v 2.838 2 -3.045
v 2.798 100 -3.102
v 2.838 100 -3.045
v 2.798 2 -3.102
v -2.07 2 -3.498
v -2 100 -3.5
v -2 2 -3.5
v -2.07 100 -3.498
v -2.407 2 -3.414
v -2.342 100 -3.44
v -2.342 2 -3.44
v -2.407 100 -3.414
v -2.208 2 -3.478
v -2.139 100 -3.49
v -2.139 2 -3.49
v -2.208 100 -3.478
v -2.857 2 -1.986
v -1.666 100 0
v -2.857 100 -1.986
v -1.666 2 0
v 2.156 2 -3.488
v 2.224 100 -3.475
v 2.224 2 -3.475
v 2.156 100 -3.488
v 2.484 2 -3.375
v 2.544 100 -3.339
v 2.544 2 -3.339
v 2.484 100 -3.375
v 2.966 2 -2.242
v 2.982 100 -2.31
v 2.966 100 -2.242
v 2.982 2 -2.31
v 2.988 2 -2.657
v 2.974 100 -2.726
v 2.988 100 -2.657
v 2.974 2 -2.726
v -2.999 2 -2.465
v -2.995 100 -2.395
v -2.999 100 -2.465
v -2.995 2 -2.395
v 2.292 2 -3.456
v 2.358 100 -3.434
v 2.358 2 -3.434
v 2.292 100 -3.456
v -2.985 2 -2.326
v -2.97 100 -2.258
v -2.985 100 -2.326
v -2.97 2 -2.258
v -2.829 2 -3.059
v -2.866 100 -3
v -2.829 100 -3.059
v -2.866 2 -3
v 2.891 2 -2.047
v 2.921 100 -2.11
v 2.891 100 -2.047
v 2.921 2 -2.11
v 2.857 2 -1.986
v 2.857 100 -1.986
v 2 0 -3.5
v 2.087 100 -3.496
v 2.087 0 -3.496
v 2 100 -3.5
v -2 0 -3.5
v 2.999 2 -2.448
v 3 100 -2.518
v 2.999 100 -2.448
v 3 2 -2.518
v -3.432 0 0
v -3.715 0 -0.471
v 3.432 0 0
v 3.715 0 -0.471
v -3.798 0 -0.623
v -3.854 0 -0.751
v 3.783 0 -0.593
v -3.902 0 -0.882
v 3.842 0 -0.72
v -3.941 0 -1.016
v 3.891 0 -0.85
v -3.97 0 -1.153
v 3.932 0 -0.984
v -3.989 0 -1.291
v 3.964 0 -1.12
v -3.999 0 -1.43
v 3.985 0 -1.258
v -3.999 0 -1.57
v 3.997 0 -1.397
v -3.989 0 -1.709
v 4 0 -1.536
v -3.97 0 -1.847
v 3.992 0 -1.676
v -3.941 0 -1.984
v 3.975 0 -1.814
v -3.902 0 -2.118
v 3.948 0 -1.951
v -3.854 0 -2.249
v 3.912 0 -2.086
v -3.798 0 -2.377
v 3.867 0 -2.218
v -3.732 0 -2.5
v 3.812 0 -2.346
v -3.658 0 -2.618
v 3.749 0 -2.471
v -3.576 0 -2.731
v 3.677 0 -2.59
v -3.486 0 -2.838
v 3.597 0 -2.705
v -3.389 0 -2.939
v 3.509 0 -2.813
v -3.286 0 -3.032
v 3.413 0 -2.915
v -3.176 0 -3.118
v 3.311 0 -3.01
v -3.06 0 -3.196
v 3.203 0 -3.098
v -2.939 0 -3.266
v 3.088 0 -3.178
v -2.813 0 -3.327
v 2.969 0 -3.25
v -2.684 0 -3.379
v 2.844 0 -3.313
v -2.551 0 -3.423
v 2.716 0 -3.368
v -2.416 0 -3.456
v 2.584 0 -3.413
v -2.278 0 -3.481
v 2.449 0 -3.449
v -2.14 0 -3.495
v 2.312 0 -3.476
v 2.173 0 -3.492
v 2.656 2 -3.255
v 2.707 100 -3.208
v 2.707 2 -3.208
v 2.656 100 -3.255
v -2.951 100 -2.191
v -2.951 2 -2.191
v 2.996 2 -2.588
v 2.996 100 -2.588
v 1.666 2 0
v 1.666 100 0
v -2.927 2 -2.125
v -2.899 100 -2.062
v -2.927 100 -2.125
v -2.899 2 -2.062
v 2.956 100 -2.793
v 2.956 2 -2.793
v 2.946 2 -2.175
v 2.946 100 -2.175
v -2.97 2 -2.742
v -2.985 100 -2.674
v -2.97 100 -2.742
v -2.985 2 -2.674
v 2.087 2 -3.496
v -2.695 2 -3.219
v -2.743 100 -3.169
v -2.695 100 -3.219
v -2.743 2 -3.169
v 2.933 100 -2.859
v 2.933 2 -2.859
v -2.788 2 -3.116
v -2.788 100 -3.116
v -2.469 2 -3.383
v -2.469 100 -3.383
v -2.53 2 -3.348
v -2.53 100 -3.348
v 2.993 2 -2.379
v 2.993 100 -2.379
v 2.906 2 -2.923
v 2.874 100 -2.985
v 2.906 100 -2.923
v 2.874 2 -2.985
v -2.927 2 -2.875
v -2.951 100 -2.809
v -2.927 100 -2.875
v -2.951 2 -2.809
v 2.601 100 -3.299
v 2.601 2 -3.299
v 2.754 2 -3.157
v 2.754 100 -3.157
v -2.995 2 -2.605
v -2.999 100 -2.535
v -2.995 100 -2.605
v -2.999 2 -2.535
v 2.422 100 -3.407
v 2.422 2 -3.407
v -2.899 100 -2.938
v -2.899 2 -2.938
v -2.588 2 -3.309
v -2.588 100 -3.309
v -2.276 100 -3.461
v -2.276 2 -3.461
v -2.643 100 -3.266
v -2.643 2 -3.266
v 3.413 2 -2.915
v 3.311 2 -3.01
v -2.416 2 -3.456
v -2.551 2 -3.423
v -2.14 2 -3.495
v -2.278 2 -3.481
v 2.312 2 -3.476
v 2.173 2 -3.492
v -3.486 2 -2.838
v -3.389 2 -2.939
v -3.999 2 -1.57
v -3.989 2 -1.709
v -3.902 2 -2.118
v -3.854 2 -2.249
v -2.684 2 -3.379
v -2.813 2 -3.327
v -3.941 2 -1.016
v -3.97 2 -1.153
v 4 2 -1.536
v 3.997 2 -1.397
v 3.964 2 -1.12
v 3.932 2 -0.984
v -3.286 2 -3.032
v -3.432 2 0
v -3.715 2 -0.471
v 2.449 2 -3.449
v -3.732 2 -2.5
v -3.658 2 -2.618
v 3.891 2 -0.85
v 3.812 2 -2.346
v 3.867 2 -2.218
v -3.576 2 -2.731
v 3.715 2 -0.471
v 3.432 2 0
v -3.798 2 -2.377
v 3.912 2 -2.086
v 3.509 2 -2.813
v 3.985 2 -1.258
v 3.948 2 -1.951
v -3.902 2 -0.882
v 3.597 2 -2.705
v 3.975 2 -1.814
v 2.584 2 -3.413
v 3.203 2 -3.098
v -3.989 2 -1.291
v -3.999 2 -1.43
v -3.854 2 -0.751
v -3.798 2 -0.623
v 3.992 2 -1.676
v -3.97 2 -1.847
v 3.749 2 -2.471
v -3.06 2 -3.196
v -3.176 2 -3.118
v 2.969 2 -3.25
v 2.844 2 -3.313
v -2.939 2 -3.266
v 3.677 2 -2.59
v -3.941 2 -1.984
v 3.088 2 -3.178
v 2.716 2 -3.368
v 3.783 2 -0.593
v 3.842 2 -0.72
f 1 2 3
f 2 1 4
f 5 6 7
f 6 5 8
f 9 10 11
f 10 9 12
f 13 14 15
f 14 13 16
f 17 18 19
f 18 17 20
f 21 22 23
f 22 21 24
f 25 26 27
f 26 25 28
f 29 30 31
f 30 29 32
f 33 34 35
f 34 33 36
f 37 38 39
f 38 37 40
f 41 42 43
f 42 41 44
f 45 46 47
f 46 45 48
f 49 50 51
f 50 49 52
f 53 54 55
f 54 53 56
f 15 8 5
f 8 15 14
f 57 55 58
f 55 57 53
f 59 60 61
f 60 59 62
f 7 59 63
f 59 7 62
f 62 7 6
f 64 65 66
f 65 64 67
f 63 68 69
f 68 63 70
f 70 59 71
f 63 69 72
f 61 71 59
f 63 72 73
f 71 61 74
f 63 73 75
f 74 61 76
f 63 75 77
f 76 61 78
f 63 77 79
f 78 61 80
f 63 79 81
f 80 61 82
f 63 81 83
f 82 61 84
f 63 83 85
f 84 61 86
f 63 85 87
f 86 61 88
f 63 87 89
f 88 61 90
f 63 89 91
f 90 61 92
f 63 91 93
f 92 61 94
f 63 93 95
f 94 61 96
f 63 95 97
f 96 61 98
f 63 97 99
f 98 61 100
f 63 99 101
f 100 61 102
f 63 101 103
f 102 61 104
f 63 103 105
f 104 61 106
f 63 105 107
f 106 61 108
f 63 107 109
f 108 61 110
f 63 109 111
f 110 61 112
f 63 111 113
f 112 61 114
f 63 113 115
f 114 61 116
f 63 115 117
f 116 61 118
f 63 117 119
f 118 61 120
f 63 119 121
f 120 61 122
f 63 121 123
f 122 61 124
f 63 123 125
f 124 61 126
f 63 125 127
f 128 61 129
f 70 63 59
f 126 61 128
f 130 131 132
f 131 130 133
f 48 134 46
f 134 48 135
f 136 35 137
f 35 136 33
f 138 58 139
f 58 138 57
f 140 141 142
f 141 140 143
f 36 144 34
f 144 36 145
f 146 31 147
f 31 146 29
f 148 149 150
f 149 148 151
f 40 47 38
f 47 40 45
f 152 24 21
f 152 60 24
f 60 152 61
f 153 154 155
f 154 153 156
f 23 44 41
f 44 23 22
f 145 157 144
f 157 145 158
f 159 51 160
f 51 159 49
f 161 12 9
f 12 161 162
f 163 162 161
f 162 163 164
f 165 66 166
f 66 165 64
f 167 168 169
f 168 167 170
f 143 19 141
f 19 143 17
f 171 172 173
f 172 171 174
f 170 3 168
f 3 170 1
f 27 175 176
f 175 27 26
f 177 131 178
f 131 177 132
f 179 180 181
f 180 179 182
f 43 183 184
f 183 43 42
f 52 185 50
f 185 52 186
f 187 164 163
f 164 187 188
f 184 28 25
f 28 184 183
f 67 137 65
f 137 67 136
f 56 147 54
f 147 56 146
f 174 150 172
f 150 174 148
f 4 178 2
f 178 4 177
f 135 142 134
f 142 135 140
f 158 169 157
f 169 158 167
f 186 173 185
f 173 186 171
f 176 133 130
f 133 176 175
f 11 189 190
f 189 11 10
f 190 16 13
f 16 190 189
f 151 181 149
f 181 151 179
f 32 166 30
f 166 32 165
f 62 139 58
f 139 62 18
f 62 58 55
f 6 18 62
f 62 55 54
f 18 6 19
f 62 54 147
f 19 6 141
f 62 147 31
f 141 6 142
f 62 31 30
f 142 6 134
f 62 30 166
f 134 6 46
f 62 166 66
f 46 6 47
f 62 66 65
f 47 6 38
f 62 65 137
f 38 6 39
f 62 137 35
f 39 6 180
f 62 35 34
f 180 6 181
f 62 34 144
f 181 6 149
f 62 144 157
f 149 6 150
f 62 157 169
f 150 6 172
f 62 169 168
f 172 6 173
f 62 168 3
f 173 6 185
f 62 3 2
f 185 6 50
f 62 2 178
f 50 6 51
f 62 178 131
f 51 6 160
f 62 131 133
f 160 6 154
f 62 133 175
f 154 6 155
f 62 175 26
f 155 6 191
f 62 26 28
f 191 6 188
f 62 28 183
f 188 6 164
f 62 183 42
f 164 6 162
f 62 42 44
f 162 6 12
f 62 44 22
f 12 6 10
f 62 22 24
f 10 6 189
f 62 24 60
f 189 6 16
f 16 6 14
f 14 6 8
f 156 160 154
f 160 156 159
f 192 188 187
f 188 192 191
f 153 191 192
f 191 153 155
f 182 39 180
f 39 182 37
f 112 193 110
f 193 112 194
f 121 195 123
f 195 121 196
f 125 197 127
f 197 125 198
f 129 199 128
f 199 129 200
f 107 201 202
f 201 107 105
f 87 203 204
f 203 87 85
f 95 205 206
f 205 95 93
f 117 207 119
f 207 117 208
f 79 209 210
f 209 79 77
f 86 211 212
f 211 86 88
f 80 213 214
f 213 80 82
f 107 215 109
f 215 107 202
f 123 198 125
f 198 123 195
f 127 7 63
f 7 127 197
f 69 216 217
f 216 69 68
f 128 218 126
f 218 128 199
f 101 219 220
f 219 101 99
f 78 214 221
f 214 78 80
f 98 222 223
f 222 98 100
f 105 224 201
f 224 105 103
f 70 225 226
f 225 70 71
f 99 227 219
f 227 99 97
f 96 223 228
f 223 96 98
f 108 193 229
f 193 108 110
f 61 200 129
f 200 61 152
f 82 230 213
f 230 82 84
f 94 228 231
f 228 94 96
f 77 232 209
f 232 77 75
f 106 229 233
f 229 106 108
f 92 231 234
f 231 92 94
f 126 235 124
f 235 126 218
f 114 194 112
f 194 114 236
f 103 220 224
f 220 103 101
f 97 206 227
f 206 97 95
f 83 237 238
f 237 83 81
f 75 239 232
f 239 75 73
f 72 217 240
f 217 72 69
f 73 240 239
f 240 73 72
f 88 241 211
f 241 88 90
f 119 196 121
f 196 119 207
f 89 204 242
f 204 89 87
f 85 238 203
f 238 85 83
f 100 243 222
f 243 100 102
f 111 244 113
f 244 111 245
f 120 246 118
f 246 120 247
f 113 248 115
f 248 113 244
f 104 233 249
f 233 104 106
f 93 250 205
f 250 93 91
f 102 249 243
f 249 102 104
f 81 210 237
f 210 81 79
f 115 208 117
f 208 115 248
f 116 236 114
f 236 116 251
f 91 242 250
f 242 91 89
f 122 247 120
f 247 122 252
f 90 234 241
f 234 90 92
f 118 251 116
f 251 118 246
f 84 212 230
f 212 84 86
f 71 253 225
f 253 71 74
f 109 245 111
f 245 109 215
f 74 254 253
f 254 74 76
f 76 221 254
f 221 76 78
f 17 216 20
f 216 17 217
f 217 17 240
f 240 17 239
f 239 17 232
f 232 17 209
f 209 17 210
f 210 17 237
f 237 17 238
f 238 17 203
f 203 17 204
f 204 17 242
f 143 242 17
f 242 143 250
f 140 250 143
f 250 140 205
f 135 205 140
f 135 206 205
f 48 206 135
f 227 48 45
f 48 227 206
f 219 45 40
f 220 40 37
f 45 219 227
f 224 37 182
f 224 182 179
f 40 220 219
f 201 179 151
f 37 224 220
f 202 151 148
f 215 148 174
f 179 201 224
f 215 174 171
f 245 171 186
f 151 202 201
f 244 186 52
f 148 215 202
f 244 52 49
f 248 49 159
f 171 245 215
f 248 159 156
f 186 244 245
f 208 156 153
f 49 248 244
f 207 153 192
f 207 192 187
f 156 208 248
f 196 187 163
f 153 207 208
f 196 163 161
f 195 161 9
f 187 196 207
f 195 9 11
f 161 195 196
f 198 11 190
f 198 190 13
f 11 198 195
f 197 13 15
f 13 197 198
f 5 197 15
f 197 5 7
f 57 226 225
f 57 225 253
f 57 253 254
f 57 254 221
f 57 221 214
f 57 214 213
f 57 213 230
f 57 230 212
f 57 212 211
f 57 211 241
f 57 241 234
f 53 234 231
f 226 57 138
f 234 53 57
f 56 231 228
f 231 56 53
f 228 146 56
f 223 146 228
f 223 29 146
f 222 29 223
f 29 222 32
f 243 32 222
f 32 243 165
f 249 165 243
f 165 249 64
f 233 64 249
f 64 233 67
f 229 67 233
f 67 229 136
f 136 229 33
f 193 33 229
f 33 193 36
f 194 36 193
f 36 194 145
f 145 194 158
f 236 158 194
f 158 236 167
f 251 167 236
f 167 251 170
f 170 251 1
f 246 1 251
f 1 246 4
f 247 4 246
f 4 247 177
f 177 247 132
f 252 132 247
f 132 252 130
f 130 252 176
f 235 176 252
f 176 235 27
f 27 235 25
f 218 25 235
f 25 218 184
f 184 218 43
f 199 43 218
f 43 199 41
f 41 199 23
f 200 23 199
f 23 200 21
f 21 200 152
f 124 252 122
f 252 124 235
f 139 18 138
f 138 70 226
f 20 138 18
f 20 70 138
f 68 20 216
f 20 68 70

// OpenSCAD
/*
 * Prusament Spool Holder Rail
 *
 * Author: Pavel Rampas
 * Version: 1.0.0 (Changelog is at the bottom)
 * License: CC BY-SA 4.0 [https://creativecommons.org/licenses/by-sa/4.0/]
 * Link: https://github.com/pavelrampas/openscad-models
 *
 * OpenSCAD version: 2019.05
 *
 * Instructions:
 * Set up parameters, render and print.
 *
 * Height is layer.
 * Thickness is perimeter.
 */

// Parameters
//------------------------------------------------------------------------------

$fn = $preview ? 15 : 90;

length = 100;

// Code
//------------------------------------------------------------------------------

rotate([-90, 0, 0]) {
    difference() {
        union(){
            linear_extrude(height = length) {
                offset(r = 1) {
                    polygon([[-0.5, 0], [0.5, 0], [2, 2.5], [-2, 2.5]]);
                }
            }

            translate([0, -1, 0]) {
                linear_extrude(height = 2) {
                    offset(r = 2) {
                        polygon([[-0.5, 0], [0.5, 0], [2, 2.5], [-2, 2.5]]);
                    }
                }
            }
        }

        translate([0, -5, 50]) {
            cube([10, 10, length], true);
        }
    }
}

// Functions
//------------------------------------------------------------------------------


// Modules
//------------------------------------------------------------------------------


// Changelog
//------------------------------------------------------------------------------

// [1.0.0]:
// Initial release.
